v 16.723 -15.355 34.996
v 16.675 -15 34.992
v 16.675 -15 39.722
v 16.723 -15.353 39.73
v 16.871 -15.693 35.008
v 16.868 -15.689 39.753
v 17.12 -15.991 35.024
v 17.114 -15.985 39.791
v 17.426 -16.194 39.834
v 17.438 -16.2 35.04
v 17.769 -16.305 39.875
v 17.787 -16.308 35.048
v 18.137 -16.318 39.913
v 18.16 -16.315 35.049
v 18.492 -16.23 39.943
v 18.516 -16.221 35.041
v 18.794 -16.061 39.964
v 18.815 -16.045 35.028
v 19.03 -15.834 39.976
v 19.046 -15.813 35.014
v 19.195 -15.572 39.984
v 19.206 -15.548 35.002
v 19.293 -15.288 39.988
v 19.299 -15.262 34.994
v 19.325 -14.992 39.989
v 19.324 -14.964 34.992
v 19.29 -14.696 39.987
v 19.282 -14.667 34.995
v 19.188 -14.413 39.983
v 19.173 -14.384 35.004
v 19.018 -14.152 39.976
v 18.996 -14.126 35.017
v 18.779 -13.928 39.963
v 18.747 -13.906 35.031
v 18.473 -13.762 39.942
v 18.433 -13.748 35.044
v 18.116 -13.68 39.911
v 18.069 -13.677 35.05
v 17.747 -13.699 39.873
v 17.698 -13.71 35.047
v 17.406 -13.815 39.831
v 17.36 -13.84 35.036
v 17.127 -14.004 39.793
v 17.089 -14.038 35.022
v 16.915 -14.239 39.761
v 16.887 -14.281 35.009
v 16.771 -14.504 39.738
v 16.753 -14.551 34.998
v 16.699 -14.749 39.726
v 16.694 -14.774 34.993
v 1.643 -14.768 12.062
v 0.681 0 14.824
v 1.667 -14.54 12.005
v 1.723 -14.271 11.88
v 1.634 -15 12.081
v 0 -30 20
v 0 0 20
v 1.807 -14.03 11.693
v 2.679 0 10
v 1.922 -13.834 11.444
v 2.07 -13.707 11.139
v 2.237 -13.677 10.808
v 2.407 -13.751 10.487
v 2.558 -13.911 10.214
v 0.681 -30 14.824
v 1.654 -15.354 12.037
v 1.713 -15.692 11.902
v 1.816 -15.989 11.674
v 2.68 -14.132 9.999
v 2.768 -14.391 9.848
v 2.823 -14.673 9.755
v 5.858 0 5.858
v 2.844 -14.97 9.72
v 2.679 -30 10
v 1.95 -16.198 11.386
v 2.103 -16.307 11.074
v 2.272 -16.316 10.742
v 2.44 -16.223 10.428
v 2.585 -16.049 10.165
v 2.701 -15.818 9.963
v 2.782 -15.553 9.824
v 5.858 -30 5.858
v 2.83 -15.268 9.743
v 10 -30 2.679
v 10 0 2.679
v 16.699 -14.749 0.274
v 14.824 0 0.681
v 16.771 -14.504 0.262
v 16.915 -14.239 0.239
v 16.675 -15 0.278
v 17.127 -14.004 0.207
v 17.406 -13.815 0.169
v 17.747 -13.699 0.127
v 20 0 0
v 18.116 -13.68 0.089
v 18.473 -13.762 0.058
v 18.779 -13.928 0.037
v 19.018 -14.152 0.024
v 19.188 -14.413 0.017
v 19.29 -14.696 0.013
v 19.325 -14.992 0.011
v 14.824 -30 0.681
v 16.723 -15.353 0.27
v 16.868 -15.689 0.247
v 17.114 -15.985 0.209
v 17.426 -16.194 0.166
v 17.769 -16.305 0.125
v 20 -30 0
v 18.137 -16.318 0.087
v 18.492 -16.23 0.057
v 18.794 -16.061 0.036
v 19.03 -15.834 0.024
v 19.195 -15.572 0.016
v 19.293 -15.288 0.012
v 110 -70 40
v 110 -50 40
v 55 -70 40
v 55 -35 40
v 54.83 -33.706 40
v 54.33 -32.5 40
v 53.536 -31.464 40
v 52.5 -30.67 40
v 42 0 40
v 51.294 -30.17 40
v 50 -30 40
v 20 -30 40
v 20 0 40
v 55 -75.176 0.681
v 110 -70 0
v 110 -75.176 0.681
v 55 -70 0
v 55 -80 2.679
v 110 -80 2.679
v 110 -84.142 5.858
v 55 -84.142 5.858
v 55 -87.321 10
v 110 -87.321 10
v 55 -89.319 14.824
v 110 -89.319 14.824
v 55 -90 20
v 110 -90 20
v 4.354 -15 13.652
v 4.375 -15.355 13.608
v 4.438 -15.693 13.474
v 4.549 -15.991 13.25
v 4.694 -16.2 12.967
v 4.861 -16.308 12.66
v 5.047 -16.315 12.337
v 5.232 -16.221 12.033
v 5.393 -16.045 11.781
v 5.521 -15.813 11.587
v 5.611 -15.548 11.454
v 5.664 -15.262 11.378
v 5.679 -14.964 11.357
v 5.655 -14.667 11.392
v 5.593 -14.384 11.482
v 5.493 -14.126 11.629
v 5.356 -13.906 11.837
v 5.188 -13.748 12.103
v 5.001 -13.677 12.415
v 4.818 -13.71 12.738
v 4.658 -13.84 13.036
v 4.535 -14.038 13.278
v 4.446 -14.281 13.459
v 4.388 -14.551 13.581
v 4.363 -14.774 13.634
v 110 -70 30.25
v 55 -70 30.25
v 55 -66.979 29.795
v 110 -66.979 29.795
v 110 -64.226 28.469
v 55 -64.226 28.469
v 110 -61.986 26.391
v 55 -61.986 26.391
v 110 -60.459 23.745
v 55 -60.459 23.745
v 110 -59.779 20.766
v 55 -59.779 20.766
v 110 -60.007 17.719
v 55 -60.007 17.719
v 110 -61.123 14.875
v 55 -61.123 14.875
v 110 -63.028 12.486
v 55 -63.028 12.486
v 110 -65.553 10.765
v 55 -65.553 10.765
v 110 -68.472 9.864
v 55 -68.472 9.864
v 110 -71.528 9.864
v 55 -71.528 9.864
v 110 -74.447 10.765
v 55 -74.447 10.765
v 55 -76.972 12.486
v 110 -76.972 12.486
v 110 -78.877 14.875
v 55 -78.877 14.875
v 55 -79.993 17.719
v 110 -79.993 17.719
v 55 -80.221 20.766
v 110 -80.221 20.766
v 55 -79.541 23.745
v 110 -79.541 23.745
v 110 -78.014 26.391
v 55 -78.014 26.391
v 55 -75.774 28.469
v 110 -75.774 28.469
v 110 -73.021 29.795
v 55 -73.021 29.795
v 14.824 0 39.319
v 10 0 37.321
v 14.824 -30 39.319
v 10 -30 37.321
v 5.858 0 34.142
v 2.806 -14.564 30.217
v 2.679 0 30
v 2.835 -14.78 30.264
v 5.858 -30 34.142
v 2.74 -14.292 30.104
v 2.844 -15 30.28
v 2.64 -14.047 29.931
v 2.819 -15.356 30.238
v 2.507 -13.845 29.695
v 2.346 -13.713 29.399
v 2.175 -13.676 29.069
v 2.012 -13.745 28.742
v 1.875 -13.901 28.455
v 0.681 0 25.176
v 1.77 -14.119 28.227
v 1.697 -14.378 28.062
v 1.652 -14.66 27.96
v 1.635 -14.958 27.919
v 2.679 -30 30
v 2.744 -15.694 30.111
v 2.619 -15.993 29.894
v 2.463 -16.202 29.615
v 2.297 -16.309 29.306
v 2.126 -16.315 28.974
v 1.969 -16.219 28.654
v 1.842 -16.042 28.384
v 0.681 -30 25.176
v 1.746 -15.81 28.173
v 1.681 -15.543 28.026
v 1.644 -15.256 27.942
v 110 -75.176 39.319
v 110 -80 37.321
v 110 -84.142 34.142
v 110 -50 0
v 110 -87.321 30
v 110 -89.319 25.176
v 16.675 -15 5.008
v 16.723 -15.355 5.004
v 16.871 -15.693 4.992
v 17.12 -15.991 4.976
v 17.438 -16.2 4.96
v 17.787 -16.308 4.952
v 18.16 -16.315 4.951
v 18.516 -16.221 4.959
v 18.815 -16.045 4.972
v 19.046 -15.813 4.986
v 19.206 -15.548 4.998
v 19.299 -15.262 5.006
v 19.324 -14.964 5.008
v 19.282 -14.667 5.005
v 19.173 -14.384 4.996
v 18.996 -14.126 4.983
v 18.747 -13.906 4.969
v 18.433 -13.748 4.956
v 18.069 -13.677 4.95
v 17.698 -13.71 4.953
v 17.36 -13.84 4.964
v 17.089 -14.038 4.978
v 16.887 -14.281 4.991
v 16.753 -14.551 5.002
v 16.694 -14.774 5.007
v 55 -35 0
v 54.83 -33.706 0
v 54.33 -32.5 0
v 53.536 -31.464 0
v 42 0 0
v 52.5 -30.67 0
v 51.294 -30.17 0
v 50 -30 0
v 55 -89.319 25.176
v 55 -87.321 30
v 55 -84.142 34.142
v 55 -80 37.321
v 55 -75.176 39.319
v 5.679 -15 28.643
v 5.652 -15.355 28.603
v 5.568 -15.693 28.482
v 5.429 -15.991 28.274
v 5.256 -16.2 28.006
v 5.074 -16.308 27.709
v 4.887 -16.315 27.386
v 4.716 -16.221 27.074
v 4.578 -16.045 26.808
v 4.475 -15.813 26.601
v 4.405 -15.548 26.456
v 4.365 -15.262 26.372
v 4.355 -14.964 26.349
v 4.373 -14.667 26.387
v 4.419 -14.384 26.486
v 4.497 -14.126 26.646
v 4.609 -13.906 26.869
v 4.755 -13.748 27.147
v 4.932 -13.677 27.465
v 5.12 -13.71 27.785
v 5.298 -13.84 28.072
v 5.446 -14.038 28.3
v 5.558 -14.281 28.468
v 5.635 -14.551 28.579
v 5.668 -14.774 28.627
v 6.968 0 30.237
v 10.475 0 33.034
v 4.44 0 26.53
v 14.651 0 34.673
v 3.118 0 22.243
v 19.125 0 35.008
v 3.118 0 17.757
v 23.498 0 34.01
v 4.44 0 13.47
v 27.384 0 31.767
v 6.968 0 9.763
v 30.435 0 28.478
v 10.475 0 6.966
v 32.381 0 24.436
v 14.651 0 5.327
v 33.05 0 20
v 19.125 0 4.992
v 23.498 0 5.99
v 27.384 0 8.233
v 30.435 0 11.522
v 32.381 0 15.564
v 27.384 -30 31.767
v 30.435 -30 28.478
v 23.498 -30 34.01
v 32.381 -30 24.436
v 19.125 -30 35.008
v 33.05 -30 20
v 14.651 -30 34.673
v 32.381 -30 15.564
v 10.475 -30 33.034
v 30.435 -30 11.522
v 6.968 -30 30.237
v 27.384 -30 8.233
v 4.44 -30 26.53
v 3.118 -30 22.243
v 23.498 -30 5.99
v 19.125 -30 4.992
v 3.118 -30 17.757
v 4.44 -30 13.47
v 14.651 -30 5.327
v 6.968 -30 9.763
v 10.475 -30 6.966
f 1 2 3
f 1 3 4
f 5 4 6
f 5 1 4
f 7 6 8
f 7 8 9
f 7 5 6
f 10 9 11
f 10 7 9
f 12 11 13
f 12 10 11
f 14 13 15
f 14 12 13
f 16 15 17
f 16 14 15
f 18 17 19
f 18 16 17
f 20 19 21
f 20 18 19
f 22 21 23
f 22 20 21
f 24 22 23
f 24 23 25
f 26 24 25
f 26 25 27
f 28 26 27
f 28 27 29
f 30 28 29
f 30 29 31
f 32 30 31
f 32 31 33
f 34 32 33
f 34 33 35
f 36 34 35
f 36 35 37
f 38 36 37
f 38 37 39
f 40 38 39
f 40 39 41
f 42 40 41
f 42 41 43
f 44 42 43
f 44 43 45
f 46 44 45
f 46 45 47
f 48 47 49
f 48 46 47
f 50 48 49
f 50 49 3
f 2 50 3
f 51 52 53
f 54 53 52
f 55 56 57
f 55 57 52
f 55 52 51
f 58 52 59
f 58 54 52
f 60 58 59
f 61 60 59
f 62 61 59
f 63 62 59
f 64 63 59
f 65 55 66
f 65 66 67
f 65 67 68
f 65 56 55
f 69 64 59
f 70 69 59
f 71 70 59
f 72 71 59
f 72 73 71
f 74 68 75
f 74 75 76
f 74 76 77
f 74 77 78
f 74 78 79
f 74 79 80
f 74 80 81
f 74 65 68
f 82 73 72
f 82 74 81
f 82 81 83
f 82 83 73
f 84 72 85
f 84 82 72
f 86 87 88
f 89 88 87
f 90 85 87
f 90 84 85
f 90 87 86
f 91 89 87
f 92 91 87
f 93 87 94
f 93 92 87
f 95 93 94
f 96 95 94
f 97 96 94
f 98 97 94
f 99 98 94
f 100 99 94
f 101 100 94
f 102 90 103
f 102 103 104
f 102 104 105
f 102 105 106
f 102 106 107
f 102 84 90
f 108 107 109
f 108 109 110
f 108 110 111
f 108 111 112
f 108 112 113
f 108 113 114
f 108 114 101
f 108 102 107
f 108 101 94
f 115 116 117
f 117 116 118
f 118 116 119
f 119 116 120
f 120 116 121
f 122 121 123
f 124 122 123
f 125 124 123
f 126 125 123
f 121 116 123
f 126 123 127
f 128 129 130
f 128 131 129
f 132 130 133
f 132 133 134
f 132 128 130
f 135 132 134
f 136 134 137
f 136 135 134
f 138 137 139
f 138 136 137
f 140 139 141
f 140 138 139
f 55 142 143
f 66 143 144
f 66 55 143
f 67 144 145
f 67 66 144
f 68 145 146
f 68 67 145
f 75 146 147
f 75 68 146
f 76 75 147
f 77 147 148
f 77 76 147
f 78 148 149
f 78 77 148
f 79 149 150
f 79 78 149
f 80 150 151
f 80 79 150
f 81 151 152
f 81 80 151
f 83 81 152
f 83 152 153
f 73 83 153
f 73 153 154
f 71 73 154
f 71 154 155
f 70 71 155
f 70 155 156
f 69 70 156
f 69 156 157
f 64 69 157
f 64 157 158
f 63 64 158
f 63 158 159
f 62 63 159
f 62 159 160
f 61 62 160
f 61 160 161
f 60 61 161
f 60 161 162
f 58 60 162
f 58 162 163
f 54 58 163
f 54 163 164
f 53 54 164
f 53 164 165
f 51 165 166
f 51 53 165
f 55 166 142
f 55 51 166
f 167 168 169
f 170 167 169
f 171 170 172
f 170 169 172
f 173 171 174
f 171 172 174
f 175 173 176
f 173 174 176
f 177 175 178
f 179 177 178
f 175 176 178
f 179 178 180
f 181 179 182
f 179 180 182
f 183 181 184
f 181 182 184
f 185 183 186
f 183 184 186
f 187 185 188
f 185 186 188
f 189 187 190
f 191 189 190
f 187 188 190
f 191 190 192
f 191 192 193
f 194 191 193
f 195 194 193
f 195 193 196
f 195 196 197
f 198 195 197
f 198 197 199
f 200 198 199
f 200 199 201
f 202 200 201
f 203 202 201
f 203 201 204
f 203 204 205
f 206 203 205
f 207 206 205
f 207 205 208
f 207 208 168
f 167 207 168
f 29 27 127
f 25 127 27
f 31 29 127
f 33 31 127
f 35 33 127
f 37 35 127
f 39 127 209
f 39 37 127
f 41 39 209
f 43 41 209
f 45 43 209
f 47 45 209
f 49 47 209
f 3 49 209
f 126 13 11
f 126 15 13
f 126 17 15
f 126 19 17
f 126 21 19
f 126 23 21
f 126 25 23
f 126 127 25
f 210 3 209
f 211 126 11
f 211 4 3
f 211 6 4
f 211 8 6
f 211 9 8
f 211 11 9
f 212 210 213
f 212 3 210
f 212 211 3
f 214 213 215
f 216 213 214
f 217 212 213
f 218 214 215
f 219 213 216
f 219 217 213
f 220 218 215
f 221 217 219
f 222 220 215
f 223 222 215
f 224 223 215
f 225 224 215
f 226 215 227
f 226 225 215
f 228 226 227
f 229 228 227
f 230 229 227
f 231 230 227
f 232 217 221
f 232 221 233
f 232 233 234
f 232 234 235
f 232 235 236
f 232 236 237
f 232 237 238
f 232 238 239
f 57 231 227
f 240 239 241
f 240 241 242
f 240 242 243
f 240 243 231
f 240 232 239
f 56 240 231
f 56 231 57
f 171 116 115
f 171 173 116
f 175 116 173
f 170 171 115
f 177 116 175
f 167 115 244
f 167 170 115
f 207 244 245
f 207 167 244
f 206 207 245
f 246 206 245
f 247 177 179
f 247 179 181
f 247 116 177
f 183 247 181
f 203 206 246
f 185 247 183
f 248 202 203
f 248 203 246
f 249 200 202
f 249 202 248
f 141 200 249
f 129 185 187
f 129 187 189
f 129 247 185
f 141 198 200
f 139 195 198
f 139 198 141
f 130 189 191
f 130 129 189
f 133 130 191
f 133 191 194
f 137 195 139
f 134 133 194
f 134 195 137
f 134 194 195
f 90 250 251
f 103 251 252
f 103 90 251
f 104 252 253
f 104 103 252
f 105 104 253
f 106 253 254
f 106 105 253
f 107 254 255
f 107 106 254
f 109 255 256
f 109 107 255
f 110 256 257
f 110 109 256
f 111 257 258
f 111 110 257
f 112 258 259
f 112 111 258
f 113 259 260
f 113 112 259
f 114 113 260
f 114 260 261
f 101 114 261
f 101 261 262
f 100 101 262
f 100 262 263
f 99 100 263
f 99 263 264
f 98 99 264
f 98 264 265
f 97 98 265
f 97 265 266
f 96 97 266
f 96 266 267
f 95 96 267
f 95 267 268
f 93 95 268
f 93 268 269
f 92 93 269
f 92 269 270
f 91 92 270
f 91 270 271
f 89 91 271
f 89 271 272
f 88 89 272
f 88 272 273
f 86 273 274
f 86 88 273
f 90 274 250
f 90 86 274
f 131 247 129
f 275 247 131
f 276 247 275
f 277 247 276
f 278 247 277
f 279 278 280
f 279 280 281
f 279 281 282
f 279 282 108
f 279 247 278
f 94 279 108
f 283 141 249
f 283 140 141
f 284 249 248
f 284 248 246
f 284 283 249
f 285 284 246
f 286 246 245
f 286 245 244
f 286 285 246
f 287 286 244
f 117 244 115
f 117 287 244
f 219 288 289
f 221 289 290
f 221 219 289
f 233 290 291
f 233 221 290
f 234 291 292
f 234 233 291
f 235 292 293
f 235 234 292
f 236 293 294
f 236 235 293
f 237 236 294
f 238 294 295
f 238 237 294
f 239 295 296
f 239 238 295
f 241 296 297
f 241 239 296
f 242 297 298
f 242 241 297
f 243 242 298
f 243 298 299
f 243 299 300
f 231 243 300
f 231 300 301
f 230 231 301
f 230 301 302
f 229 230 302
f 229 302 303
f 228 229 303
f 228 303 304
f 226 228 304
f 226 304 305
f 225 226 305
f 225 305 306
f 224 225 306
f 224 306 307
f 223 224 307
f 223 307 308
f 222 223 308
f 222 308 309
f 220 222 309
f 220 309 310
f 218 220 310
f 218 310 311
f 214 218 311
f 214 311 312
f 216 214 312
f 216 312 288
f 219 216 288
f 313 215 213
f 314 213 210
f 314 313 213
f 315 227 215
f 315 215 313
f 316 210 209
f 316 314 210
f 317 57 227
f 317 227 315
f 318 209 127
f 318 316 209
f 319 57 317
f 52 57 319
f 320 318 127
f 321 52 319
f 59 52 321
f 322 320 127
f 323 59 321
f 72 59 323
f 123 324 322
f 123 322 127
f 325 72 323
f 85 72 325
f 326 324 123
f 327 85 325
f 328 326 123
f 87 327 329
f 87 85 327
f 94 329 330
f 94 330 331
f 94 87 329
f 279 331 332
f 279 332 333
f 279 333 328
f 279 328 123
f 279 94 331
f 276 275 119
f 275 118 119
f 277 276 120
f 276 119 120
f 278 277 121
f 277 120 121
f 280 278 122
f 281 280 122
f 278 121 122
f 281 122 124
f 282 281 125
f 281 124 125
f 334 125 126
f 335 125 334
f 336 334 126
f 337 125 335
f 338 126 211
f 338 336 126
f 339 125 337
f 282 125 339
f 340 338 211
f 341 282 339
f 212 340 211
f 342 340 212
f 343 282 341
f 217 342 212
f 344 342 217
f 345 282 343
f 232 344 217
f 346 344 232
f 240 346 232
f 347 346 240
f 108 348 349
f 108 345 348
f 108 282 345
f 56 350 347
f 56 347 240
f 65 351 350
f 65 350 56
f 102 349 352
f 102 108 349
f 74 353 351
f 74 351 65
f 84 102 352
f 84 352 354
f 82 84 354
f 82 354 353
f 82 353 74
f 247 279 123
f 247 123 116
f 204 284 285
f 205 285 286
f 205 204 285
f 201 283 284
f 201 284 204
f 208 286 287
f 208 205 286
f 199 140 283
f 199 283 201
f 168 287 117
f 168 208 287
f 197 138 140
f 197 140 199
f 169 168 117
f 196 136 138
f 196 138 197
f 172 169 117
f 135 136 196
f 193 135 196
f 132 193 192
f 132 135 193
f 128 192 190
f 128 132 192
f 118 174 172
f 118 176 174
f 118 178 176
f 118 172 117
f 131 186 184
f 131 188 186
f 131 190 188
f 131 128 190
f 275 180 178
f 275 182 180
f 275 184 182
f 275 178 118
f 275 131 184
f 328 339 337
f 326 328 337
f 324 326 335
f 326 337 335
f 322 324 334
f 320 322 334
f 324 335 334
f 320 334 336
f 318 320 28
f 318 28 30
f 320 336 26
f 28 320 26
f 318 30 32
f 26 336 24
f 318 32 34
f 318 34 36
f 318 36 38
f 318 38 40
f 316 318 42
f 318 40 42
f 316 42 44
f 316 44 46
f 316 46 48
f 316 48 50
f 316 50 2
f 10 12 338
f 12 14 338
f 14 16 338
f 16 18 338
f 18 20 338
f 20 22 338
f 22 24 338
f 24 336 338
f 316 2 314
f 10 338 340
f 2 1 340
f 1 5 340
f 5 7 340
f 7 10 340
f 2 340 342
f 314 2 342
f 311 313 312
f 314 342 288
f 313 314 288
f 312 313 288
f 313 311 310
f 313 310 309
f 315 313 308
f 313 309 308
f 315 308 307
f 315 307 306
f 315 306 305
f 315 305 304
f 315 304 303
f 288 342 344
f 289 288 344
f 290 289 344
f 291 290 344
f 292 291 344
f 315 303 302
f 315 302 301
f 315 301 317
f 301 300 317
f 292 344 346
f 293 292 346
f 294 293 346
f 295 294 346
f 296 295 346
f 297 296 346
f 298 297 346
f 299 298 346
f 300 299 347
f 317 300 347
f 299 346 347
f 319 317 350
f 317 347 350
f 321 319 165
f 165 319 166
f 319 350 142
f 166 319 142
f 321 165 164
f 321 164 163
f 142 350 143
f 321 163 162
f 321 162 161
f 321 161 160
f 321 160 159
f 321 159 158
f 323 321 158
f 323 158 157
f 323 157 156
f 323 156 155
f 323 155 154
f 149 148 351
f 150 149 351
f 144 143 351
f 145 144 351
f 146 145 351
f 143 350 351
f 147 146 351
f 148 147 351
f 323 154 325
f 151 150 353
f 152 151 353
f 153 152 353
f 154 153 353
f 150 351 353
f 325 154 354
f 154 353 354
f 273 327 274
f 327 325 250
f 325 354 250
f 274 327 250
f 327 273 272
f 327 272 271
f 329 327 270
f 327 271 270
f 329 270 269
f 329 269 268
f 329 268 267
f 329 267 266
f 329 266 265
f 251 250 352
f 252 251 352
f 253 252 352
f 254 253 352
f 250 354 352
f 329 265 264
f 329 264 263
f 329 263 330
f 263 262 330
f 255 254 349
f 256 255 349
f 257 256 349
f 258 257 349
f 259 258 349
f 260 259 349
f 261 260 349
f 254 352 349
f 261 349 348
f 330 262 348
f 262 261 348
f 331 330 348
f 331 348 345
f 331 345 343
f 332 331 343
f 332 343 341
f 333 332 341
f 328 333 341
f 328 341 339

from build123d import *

# Parameters (mm, degrees)
BOSS_EXTRUDE1_DEPTH     = 40
FILLET1_R               = 5
CUT_EXTRUDE1_REACH      = 114.805
SKETCH2_R               = 10.25
CUT_EXTRUDE2_REACH      = 133.529
SKETCH3_R               = 15.05
FILLET3_R               = 20
CUT_EXTRUDE5_DEPTH      = 37
CUT_EXTRUDE5_DEPTH_BACK = 7
SKETCH7_R               = 1.325
CUT_EXTRUDE7_DEPTH      = 7
CUT_EXTRUDE7_DEPTH_BACK = 7
SKETCH8_R               = 1.325
CUT_EXTRUDE8_DEPTH      = 7
CUT_EXTRUDE8_DEPTH_BACK = 7
SKETCH9_R               = 1.325
FILLET4_START           = -30
FILLET4_DEPTH           = 30


with BuildPart() as part:
    # Sketch1 → Boss-Extrude1 (new body)
    with BuildSketch(Plane.XY):
        Polygon((0, 0), (42, 0), (110, -50), (110, -90), (55, -90), (55, -30), (0, -30), align=None)
    extrude(amount=BOSS_EXTRUDE1_DEPTH)

    # Fillet1
    fillet1_edges = [part.edges().sort_by_distance(p)[0] for p in [
        (55, -30, 20),
    ]]
    fillet(fillet1_edges, radius=FILLET1_R)

    # Sketch2 → Cut-Extrude1 (cut, up to next)
    with BuildSketch(Plane.ZY.offset(-55), mode=Mode.PRIVATE) as cut_extrude1_sk1:
        with Locations((20, -70)):
            Circle(SKETCH2_R)
    cut_extrude1_tool1 = extrude(cut_extrude1_sk1.sketch, amount=-CUT_EXTRUDE1_REACH, mode=Mode.PRIVATE) & part.part
    add(cut_extrude1_tool1.solids().sort_by_distance((55, -70, 20))[0], mode=Mode.SUBTRACT)

    # Sketch3 → Cut-Extrude2 (cut, up to next)
    with BuildSketch(Plane.XZ.offset(30), mode=Mode.PRIVATE) as cut_extrude2_sk1:
        with Locations((18, 20)):
            Circle(SKETCH3_R)
    cut_extrude2_tool1 = extrude(cut_extrude2_sk1.sketch, amount=-CUT_EXTRUDE2_REACH, mode=Mode.PRIVATE) & part.part
    add(cut_extrude2_tool1.solids().sort_by_distance((18, -30, 20))[0], mode=Mode.SUBTRACT)

    # Fillet3
    fillet3_edges = [part.edges().sort_by_distance(p)[0] for p in [
        (82.5, -90, 0),
        (82.5, -90, 40),
    ]]
    fillet(fillet3_edges, radius=FILLET3_R - 0.0001)  # a hair under: the kernel refuses the full size

    # Sketch7 → Cut-Extrude5 (cut, two sides: drawn at the far end of the back side and taken through both)
    with BuildSketch(Plane.XY.offset(4.95).offset(-CUT_EXTRUDE5_DEPTH_BACK)):
        with Locations(Location((18, -15, 0), (0, 0, 180))):
            Circle(SKETCH7_R)
    extrude(amount=CUT_EXTRUDE5_DEPTH + CUT_EXTRUDE5_DEPTH_BACK, mode=Mode.SUBTRACT)

    # Sketch8 → Cut-Extrude7 (cut, two sides: drawn at the far end of the back side and taken through both)
    with BuildSketch(Plane(origin=(9.126571711, 0, 5.269228634), x_dir=(0.4999999999999973, 0, -0.8660254037844402), z_dir=(0.8660254037844403, 0, 0.4999999999999973)).offset(-CUT_EXTRUDE7_DEPTH_BACK)):
        with Locations(Location((-8.320508076, -15, 0), (0, 0, 180))):
            Circle(SKETCH8_R)
    extrude(amount=CUT_EXTRUDE7_DEPTH + CUT_EXTRUDE7_DEPTH_BACK, mode=Mode.SUBTRACT)

    # Sketch9 → Cut-Extrude8 (cut, two sides: drawn at the far end of the back side and taken through both)
    with BuildSketch(Plane(origin=(4.966317673, 0, 27.525), x_dir=(-0.49999999999999806, 0, -0.8660254037844399), z_dir=(0.8660254037844399, 0, -0.49999999999999806)).offset(-CUT_EXTRUDE8_DEPTH_BACK)):
        with Locations(Location((0, -15, 0), (0, 0, 180))):
            Circle(SKETCH9_R)
    extrude(amount=CUT_EXTRUDE8_DEPTH + CUT_EXTRUDE8_DEPTH_BACK, mode=Mode.SUBTRACT)

    # Fillet4: read off the stored shape, not the designer's step
    # Fillet4 outline → Fillet4 (cut)
    with BuildSketch(Plane(origin=(0, 0, 0), x_dir=(1, 0, 0), z_dir=(0, 1, 0)).offset(FILLET4_START)):
        with BuildLine():
            ThreePointArc((20, -40), (5.857864376, -34.142135624), (0, -20))
            Line((0, -20), (0, -40))
            Line((0, -40), (20, -40))
        make_face()
        with BuildLine():
            ThreePointArc((0, -20), (5.857864376, -5.857864376), (20, 0))
            Line((20, 0), (0, 0))
            Line((0, 0), (0, -20))
        make_face()
    extrude(amount=FILLET4_DEPTH, mode=Mode.SUBTRACT)


solid = part.part
